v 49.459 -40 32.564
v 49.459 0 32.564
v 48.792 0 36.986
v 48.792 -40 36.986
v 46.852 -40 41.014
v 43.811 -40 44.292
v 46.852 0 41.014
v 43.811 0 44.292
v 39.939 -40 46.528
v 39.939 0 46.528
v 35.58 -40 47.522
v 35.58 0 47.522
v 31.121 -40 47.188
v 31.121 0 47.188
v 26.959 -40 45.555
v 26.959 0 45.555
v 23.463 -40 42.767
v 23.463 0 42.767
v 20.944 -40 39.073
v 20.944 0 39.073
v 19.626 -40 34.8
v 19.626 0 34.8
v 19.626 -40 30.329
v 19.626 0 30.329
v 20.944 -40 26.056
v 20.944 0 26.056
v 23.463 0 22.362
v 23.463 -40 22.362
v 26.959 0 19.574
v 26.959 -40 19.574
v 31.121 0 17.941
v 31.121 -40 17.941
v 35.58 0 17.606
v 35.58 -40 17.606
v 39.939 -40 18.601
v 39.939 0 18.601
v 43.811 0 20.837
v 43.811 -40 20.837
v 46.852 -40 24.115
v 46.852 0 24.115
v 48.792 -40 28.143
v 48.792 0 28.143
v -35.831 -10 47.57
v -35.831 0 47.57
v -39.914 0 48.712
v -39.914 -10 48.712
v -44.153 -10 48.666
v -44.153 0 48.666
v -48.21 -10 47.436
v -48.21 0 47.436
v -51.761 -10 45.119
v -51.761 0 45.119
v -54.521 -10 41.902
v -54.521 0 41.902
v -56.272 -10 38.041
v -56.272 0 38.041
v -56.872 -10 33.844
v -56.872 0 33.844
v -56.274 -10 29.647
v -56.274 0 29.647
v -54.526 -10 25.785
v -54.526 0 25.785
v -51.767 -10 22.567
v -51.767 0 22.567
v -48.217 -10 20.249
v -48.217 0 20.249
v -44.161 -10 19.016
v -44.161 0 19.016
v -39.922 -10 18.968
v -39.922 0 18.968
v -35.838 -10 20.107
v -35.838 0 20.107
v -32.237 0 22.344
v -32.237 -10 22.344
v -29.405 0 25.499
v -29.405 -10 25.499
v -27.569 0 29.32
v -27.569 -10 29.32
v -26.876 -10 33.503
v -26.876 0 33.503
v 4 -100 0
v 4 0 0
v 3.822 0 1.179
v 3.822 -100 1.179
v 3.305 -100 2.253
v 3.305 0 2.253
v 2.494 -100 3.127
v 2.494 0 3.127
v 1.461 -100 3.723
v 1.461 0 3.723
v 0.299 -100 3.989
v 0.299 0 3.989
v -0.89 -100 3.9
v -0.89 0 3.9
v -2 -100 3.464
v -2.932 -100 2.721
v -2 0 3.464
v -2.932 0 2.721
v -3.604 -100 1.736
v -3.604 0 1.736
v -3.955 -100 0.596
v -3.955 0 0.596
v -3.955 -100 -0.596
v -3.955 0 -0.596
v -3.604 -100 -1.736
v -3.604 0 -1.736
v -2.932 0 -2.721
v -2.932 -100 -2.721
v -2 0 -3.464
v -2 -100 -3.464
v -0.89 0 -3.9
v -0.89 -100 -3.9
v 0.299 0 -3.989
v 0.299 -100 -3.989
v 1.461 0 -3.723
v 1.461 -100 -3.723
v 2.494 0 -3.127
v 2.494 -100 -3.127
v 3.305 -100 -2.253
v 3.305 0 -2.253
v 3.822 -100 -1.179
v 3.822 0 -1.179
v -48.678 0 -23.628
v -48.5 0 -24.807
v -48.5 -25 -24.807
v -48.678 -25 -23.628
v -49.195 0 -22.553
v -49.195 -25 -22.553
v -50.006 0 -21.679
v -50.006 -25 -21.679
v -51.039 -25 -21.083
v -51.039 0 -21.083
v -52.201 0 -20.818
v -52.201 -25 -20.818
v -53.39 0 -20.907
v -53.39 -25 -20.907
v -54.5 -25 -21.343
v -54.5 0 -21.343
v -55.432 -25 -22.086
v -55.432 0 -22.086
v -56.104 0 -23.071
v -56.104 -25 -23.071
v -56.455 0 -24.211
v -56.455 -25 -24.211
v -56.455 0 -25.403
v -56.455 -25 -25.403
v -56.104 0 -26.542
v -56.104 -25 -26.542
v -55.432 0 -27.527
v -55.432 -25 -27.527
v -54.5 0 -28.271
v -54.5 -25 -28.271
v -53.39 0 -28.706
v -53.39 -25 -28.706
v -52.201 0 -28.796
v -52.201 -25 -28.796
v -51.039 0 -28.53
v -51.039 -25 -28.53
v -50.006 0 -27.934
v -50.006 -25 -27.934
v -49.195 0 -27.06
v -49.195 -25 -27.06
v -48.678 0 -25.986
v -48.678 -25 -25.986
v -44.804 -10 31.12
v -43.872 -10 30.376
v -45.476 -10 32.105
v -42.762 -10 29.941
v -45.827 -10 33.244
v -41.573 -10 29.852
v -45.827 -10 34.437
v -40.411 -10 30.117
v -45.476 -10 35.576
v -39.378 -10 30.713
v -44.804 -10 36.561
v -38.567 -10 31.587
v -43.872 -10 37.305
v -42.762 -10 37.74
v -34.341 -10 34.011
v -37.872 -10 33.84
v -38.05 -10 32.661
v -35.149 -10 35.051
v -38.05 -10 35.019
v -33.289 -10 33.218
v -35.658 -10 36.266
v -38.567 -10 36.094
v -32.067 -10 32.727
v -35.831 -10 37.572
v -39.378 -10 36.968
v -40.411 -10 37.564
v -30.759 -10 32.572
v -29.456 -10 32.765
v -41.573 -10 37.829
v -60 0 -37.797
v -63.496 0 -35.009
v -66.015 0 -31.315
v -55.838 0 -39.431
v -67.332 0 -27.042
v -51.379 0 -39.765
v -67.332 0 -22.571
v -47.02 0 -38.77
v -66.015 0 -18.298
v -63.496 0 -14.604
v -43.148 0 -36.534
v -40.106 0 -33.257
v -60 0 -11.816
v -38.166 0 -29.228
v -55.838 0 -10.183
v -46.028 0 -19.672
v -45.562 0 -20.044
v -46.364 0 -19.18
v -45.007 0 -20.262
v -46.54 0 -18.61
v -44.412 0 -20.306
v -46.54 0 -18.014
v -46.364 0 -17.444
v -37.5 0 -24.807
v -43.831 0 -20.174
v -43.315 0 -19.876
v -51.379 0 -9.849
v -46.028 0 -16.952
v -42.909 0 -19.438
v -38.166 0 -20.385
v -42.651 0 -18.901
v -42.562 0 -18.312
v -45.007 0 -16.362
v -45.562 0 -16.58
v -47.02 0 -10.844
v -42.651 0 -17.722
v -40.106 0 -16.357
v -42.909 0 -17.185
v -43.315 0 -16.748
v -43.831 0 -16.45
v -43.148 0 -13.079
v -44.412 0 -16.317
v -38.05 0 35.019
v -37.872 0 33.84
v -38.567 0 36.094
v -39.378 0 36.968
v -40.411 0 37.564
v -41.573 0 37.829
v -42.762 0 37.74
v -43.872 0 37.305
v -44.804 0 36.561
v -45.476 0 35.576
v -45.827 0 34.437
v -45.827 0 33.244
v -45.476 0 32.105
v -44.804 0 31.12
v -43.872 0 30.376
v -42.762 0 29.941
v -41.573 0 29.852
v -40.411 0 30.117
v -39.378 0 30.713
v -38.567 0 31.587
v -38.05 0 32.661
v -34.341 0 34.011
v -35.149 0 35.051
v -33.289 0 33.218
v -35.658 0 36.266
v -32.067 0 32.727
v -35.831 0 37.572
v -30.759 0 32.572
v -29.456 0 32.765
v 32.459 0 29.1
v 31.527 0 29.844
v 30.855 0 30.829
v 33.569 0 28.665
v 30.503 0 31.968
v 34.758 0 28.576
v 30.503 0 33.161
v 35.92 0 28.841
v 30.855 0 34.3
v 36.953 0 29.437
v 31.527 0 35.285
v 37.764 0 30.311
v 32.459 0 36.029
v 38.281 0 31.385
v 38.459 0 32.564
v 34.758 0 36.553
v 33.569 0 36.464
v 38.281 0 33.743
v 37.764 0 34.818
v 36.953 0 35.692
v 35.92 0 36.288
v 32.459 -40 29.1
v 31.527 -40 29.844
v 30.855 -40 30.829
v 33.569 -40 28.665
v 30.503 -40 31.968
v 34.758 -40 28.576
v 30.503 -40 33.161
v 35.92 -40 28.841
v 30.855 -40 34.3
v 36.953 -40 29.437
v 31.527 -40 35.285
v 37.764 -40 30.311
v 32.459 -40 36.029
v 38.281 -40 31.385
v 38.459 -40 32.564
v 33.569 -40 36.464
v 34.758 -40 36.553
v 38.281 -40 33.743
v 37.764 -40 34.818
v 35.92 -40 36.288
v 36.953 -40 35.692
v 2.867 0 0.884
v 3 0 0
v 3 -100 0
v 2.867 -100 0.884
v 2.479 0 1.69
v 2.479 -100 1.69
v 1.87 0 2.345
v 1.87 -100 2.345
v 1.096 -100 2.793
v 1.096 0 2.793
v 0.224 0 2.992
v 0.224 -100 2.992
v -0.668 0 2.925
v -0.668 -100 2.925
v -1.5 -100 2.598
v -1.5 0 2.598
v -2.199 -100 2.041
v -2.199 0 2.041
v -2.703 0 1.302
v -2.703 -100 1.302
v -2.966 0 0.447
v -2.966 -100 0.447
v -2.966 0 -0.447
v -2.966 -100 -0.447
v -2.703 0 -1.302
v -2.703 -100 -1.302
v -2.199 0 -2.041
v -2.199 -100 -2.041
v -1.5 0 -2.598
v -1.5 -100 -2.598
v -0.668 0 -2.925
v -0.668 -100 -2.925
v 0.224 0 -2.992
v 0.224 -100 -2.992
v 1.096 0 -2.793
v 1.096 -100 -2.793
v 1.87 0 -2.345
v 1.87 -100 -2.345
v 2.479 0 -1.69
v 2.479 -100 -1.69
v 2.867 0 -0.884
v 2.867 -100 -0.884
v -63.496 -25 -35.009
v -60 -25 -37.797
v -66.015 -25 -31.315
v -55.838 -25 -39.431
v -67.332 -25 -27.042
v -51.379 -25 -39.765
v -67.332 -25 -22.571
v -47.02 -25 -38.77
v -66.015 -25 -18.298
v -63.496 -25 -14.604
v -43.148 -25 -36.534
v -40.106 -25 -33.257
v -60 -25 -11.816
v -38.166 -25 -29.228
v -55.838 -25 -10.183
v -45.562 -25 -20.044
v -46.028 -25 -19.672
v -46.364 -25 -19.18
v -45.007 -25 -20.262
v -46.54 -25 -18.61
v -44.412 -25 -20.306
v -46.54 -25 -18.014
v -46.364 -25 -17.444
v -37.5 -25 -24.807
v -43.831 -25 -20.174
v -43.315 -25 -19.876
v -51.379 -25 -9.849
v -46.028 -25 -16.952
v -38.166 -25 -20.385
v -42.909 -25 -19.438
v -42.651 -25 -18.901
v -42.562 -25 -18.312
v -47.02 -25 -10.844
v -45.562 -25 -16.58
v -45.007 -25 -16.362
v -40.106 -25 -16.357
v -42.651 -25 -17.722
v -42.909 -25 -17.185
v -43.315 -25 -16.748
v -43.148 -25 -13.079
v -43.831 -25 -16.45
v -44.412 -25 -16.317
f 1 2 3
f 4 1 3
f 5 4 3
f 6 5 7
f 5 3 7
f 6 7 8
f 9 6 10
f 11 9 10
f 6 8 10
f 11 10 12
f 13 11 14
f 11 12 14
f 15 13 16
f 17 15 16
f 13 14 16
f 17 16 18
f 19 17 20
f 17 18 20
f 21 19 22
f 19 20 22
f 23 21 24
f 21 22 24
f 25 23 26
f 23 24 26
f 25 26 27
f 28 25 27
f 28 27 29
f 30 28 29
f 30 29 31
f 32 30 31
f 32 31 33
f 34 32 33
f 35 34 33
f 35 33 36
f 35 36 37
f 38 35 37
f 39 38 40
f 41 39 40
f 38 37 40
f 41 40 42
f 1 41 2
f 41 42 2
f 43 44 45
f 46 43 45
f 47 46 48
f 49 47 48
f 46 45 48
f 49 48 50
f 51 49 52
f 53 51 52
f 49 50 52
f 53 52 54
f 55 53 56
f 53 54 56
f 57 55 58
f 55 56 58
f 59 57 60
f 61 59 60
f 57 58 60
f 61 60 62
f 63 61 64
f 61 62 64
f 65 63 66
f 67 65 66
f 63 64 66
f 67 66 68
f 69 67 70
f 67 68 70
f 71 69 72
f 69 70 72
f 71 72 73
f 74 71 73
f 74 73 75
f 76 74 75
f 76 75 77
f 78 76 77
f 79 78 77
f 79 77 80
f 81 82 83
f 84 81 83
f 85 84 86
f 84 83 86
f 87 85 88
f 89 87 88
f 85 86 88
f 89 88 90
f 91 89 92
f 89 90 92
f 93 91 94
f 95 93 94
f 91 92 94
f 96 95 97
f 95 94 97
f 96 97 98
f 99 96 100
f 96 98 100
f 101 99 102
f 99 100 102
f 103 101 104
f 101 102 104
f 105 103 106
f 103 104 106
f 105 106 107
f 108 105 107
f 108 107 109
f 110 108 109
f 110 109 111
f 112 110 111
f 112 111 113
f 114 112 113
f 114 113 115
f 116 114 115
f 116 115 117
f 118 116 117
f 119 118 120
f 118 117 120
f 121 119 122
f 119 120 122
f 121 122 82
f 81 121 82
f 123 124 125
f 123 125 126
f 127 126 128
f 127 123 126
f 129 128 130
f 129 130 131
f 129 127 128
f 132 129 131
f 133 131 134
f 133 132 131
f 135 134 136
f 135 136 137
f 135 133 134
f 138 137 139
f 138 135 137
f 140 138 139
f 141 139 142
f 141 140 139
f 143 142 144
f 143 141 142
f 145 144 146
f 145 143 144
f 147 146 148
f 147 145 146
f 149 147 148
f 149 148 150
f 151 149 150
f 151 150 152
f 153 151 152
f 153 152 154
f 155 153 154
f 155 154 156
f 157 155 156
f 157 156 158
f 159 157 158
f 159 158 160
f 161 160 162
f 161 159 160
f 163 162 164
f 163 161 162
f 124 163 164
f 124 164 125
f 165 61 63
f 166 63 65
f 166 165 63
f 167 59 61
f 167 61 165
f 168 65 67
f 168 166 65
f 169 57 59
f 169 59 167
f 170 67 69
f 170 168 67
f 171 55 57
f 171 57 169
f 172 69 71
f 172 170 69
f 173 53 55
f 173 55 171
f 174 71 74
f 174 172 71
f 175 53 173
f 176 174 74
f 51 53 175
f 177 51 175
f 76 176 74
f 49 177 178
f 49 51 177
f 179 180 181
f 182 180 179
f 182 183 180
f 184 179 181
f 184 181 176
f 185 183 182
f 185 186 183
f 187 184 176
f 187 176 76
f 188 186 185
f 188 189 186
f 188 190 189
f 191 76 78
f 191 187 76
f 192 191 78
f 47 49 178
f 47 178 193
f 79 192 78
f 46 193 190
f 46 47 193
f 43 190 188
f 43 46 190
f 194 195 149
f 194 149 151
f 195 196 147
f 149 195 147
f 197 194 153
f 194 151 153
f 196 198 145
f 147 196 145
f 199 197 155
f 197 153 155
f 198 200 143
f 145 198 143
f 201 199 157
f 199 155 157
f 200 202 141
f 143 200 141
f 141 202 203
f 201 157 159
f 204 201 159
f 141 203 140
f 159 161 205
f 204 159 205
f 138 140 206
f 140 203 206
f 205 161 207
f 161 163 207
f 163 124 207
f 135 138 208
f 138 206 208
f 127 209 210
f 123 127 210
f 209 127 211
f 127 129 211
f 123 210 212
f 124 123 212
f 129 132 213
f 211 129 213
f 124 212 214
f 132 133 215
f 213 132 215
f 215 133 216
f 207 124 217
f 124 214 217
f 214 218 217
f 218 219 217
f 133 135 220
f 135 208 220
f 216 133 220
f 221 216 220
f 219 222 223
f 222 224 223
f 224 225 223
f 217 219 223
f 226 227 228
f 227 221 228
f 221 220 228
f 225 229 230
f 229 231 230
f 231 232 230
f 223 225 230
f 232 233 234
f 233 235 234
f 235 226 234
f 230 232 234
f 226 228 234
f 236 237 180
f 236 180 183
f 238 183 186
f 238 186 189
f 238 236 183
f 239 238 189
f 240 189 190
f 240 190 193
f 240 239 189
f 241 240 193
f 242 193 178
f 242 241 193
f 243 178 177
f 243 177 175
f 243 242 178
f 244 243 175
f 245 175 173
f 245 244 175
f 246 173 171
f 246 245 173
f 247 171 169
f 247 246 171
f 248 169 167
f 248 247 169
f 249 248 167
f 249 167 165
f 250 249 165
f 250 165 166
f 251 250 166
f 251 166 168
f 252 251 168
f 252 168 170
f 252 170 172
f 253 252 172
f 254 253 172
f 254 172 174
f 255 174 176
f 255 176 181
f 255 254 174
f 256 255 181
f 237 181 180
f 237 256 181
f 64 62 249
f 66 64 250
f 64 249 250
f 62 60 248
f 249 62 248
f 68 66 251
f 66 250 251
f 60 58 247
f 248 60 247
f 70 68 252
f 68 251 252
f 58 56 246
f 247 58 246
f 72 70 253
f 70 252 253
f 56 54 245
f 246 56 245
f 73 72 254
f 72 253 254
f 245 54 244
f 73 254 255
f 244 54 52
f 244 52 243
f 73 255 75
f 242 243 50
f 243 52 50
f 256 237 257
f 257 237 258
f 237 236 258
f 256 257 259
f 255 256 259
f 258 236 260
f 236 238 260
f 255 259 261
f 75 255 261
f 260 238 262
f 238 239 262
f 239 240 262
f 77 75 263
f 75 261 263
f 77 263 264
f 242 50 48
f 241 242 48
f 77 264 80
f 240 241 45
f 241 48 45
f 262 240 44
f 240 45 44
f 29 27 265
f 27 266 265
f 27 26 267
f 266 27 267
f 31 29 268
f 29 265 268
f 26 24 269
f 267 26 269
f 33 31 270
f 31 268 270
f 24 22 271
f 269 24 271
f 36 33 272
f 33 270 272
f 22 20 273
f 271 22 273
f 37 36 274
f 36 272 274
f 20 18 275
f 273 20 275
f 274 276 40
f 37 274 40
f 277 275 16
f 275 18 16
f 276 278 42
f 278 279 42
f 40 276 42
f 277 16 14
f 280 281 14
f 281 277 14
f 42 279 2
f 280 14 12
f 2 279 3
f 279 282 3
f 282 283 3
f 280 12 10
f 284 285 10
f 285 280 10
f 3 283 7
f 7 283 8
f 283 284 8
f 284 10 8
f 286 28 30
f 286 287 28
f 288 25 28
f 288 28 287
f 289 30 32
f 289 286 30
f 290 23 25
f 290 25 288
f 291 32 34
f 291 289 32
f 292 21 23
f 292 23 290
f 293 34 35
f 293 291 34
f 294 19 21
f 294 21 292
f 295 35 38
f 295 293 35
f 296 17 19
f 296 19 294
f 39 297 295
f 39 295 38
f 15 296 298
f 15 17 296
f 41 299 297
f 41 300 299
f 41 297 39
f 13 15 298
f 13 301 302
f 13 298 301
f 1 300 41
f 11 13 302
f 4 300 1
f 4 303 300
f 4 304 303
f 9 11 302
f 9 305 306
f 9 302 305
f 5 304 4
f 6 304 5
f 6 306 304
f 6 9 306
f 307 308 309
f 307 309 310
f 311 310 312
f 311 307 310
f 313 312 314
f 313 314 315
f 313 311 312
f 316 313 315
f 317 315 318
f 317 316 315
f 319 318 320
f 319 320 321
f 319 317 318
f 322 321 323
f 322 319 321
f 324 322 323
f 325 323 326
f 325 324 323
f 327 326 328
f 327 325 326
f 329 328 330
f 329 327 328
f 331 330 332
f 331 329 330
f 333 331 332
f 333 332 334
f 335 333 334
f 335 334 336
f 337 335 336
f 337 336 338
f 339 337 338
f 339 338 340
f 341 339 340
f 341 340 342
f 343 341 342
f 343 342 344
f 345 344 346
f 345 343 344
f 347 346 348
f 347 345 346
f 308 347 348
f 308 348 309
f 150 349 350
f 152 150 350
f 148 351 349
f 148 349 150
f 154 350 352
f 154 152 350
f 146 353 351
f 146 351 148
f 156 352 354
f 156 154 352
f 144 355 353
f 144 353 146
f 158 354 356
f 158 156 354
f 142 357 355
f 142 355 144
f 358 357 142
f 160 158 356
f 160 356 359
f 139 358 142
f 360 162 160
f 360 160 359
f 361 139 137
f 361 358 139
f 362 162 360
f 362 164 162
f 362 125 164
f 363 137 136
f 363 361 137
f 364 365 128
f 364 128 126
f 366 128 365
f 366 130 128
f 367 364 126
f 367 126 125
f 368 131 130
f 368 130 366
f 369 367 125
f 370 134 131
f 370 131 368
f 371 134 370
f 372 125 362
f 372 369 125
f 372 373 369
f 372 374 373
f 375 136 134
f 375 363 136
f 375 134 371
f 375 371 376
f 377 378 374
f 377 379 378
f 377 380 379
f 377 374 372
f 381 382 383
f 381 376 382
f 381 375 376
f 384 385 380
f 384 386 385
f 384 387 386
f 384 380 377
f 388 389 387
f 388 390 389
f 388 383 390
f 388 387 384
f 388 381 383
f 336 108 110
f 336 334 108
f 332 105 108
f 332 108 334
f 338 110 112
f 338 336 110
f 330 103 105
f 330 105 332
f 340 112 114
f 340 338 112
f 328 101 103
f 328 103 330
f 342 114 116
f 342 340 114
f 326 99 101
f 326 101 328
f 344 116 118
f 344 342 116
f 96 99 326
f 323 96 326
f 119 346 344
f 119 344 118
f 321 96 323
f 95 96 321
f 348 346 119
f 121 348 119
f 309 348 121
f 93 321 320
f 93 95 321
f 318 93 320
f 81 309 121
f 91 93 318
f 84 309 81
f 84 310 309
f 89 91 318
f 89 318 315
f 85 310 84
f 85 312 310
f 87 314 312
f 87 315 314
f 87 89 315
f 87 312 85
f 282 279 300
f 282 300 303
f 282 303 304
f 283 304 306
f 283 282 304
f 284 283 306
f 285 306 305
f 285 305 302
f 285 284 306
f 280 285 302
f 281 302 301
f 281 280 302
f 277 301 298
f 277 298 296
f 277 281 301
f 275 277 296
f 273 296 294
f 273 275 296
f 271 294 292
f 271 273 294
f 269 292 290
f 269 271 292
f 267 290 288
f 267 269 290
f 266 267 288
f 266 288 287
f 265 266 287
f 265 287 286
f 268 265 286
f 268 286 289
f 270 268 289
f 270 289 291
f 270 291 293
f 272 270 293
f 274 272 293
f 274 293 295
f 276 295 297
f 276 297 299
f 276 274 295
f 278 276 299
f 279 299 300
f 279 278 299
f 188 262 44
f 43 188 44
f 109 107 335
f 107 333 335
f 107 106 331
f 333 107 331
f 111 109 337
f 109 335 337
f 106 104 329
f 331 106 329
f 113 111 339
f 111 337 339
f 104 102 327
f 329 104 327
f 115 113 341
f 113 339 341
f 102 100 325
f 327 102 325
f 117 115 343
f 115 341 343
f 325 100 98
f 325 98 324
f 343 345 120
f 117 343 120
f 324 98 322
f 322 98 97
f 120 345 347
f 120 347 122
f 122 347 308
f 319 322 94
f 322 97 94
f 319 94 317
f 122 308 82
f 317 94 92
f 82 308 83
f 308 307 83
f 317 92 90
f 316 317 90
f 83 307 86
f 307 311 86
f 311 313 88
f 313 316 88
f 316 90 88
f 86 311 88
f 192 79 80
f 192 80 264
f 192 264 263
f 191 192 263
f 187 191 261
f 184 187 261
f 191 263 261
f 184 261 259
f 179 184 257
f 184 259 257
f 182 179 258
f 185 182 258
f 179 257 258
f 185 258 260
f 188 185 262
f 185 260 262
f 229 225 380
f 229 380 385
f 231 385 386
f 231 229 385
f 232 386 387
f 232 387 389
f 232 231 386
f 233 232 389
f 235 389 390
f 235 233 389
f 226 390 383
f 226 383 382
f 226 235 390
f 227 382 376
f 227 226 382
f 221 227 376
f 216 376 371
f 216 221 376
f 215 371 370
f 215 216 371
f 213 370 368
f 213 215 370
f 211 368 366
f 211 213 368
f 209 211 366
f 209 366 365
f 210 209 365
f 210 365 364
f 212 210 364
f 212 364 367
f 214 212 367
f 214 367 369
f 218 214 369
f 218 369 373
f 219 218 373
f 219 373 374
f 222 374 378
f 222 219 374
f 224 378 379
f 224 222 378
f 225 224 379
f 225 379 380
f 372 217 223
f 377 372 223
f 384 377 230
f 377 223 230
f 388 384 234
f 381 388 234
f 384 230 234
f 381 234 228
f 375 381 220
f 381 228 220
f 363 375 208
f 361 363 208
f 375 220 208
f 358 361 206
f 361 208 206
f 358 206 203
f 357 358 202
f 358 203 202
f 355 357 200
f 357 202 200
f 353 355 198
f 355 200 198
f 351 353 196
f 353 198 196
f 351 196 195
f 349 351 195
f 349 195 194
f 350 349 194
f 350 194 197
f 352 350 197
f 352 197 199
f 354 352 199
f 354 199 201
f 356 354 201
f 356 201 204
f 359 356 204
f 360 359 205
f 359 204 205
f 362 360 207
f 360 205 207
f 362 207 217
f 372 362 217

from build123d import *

# Parameters (mm, degrees)
F0_R     = 4
F0_R_2   = 3
F1_DEPTH = 100
F2_R     = 15
F2_R_2   = 4
F3_DEPTH = 40
F4_R     = 4
F5_DEPTH = 10
F6_R     = 15
F6_R_2   = 4
F6_R_3   = 2
F7_DEPTH = 25


with BuildPart() as f1:
    # F0 (on Front) → F1 (new body)
    with BuildSketch(Plane.XZ):
        Circle(F0_R)
        Circle(F0_R_2, mode=Mode.SUBTRACT)
    extrude(amount=F1_DEPTH)


with BuildPart() as f3:
    # F2 (on Front) → F3 (new body)
    with BuildSketch(Plane.XZ):
        with Locations((34.458764, 32.564435)):
            Circle(F2_R)
        with Locations((34.458764, 32.564435)):
            Circle(F2_R_2, mode=Mode.SUBTRACT)
    extrude(amount=F3_DEPTH)


with BuildPart() as f5:
    # F4 (on Front) → F5 (new body)
    with BuildSketch(Plane.XZ):
        with BuildLine():
            Line((-35.831102, 37.571837), (-35.831102, 47.570273))
            ThreePointArc((-35.831102, 47.570273), (-54.525651, 25.78533), (-26.875812, 33.502605))
            Line((-26.875812, 33.502605), (-29.45618, 32.764593))
            ThreePointArc((-29.45618, 32.764593), (-33.841533, 33.579681), (-35.831102, 37.571837))
        make_face()
        with Locations((-41.872007, 33.840471)):
            Circle(F4_R, mode=Mode.SUBTRACT)
    extrude(amount=F5_DEPTH)


with BuildPart() as f7:
    # F6 (on Front) → F7 (new body)
    with BuildSketch(Plane.XZ):
        with Locations((-52.499991, -24.806706)):
            Circle(F6_R)
        with Locations((-52.499991, -24.806706)):
            Circle(F6_R_2, mode=Mode.SUBTRACT)
        with Locations((-44.561859, -18.311856)):
            Circle(F6_R_3, mode=Mode.SUBTRACT)
    extrude(amount=F7_DEPTH)


solid = Compound([f1.part, f3.part, f5.part, f7.part])
